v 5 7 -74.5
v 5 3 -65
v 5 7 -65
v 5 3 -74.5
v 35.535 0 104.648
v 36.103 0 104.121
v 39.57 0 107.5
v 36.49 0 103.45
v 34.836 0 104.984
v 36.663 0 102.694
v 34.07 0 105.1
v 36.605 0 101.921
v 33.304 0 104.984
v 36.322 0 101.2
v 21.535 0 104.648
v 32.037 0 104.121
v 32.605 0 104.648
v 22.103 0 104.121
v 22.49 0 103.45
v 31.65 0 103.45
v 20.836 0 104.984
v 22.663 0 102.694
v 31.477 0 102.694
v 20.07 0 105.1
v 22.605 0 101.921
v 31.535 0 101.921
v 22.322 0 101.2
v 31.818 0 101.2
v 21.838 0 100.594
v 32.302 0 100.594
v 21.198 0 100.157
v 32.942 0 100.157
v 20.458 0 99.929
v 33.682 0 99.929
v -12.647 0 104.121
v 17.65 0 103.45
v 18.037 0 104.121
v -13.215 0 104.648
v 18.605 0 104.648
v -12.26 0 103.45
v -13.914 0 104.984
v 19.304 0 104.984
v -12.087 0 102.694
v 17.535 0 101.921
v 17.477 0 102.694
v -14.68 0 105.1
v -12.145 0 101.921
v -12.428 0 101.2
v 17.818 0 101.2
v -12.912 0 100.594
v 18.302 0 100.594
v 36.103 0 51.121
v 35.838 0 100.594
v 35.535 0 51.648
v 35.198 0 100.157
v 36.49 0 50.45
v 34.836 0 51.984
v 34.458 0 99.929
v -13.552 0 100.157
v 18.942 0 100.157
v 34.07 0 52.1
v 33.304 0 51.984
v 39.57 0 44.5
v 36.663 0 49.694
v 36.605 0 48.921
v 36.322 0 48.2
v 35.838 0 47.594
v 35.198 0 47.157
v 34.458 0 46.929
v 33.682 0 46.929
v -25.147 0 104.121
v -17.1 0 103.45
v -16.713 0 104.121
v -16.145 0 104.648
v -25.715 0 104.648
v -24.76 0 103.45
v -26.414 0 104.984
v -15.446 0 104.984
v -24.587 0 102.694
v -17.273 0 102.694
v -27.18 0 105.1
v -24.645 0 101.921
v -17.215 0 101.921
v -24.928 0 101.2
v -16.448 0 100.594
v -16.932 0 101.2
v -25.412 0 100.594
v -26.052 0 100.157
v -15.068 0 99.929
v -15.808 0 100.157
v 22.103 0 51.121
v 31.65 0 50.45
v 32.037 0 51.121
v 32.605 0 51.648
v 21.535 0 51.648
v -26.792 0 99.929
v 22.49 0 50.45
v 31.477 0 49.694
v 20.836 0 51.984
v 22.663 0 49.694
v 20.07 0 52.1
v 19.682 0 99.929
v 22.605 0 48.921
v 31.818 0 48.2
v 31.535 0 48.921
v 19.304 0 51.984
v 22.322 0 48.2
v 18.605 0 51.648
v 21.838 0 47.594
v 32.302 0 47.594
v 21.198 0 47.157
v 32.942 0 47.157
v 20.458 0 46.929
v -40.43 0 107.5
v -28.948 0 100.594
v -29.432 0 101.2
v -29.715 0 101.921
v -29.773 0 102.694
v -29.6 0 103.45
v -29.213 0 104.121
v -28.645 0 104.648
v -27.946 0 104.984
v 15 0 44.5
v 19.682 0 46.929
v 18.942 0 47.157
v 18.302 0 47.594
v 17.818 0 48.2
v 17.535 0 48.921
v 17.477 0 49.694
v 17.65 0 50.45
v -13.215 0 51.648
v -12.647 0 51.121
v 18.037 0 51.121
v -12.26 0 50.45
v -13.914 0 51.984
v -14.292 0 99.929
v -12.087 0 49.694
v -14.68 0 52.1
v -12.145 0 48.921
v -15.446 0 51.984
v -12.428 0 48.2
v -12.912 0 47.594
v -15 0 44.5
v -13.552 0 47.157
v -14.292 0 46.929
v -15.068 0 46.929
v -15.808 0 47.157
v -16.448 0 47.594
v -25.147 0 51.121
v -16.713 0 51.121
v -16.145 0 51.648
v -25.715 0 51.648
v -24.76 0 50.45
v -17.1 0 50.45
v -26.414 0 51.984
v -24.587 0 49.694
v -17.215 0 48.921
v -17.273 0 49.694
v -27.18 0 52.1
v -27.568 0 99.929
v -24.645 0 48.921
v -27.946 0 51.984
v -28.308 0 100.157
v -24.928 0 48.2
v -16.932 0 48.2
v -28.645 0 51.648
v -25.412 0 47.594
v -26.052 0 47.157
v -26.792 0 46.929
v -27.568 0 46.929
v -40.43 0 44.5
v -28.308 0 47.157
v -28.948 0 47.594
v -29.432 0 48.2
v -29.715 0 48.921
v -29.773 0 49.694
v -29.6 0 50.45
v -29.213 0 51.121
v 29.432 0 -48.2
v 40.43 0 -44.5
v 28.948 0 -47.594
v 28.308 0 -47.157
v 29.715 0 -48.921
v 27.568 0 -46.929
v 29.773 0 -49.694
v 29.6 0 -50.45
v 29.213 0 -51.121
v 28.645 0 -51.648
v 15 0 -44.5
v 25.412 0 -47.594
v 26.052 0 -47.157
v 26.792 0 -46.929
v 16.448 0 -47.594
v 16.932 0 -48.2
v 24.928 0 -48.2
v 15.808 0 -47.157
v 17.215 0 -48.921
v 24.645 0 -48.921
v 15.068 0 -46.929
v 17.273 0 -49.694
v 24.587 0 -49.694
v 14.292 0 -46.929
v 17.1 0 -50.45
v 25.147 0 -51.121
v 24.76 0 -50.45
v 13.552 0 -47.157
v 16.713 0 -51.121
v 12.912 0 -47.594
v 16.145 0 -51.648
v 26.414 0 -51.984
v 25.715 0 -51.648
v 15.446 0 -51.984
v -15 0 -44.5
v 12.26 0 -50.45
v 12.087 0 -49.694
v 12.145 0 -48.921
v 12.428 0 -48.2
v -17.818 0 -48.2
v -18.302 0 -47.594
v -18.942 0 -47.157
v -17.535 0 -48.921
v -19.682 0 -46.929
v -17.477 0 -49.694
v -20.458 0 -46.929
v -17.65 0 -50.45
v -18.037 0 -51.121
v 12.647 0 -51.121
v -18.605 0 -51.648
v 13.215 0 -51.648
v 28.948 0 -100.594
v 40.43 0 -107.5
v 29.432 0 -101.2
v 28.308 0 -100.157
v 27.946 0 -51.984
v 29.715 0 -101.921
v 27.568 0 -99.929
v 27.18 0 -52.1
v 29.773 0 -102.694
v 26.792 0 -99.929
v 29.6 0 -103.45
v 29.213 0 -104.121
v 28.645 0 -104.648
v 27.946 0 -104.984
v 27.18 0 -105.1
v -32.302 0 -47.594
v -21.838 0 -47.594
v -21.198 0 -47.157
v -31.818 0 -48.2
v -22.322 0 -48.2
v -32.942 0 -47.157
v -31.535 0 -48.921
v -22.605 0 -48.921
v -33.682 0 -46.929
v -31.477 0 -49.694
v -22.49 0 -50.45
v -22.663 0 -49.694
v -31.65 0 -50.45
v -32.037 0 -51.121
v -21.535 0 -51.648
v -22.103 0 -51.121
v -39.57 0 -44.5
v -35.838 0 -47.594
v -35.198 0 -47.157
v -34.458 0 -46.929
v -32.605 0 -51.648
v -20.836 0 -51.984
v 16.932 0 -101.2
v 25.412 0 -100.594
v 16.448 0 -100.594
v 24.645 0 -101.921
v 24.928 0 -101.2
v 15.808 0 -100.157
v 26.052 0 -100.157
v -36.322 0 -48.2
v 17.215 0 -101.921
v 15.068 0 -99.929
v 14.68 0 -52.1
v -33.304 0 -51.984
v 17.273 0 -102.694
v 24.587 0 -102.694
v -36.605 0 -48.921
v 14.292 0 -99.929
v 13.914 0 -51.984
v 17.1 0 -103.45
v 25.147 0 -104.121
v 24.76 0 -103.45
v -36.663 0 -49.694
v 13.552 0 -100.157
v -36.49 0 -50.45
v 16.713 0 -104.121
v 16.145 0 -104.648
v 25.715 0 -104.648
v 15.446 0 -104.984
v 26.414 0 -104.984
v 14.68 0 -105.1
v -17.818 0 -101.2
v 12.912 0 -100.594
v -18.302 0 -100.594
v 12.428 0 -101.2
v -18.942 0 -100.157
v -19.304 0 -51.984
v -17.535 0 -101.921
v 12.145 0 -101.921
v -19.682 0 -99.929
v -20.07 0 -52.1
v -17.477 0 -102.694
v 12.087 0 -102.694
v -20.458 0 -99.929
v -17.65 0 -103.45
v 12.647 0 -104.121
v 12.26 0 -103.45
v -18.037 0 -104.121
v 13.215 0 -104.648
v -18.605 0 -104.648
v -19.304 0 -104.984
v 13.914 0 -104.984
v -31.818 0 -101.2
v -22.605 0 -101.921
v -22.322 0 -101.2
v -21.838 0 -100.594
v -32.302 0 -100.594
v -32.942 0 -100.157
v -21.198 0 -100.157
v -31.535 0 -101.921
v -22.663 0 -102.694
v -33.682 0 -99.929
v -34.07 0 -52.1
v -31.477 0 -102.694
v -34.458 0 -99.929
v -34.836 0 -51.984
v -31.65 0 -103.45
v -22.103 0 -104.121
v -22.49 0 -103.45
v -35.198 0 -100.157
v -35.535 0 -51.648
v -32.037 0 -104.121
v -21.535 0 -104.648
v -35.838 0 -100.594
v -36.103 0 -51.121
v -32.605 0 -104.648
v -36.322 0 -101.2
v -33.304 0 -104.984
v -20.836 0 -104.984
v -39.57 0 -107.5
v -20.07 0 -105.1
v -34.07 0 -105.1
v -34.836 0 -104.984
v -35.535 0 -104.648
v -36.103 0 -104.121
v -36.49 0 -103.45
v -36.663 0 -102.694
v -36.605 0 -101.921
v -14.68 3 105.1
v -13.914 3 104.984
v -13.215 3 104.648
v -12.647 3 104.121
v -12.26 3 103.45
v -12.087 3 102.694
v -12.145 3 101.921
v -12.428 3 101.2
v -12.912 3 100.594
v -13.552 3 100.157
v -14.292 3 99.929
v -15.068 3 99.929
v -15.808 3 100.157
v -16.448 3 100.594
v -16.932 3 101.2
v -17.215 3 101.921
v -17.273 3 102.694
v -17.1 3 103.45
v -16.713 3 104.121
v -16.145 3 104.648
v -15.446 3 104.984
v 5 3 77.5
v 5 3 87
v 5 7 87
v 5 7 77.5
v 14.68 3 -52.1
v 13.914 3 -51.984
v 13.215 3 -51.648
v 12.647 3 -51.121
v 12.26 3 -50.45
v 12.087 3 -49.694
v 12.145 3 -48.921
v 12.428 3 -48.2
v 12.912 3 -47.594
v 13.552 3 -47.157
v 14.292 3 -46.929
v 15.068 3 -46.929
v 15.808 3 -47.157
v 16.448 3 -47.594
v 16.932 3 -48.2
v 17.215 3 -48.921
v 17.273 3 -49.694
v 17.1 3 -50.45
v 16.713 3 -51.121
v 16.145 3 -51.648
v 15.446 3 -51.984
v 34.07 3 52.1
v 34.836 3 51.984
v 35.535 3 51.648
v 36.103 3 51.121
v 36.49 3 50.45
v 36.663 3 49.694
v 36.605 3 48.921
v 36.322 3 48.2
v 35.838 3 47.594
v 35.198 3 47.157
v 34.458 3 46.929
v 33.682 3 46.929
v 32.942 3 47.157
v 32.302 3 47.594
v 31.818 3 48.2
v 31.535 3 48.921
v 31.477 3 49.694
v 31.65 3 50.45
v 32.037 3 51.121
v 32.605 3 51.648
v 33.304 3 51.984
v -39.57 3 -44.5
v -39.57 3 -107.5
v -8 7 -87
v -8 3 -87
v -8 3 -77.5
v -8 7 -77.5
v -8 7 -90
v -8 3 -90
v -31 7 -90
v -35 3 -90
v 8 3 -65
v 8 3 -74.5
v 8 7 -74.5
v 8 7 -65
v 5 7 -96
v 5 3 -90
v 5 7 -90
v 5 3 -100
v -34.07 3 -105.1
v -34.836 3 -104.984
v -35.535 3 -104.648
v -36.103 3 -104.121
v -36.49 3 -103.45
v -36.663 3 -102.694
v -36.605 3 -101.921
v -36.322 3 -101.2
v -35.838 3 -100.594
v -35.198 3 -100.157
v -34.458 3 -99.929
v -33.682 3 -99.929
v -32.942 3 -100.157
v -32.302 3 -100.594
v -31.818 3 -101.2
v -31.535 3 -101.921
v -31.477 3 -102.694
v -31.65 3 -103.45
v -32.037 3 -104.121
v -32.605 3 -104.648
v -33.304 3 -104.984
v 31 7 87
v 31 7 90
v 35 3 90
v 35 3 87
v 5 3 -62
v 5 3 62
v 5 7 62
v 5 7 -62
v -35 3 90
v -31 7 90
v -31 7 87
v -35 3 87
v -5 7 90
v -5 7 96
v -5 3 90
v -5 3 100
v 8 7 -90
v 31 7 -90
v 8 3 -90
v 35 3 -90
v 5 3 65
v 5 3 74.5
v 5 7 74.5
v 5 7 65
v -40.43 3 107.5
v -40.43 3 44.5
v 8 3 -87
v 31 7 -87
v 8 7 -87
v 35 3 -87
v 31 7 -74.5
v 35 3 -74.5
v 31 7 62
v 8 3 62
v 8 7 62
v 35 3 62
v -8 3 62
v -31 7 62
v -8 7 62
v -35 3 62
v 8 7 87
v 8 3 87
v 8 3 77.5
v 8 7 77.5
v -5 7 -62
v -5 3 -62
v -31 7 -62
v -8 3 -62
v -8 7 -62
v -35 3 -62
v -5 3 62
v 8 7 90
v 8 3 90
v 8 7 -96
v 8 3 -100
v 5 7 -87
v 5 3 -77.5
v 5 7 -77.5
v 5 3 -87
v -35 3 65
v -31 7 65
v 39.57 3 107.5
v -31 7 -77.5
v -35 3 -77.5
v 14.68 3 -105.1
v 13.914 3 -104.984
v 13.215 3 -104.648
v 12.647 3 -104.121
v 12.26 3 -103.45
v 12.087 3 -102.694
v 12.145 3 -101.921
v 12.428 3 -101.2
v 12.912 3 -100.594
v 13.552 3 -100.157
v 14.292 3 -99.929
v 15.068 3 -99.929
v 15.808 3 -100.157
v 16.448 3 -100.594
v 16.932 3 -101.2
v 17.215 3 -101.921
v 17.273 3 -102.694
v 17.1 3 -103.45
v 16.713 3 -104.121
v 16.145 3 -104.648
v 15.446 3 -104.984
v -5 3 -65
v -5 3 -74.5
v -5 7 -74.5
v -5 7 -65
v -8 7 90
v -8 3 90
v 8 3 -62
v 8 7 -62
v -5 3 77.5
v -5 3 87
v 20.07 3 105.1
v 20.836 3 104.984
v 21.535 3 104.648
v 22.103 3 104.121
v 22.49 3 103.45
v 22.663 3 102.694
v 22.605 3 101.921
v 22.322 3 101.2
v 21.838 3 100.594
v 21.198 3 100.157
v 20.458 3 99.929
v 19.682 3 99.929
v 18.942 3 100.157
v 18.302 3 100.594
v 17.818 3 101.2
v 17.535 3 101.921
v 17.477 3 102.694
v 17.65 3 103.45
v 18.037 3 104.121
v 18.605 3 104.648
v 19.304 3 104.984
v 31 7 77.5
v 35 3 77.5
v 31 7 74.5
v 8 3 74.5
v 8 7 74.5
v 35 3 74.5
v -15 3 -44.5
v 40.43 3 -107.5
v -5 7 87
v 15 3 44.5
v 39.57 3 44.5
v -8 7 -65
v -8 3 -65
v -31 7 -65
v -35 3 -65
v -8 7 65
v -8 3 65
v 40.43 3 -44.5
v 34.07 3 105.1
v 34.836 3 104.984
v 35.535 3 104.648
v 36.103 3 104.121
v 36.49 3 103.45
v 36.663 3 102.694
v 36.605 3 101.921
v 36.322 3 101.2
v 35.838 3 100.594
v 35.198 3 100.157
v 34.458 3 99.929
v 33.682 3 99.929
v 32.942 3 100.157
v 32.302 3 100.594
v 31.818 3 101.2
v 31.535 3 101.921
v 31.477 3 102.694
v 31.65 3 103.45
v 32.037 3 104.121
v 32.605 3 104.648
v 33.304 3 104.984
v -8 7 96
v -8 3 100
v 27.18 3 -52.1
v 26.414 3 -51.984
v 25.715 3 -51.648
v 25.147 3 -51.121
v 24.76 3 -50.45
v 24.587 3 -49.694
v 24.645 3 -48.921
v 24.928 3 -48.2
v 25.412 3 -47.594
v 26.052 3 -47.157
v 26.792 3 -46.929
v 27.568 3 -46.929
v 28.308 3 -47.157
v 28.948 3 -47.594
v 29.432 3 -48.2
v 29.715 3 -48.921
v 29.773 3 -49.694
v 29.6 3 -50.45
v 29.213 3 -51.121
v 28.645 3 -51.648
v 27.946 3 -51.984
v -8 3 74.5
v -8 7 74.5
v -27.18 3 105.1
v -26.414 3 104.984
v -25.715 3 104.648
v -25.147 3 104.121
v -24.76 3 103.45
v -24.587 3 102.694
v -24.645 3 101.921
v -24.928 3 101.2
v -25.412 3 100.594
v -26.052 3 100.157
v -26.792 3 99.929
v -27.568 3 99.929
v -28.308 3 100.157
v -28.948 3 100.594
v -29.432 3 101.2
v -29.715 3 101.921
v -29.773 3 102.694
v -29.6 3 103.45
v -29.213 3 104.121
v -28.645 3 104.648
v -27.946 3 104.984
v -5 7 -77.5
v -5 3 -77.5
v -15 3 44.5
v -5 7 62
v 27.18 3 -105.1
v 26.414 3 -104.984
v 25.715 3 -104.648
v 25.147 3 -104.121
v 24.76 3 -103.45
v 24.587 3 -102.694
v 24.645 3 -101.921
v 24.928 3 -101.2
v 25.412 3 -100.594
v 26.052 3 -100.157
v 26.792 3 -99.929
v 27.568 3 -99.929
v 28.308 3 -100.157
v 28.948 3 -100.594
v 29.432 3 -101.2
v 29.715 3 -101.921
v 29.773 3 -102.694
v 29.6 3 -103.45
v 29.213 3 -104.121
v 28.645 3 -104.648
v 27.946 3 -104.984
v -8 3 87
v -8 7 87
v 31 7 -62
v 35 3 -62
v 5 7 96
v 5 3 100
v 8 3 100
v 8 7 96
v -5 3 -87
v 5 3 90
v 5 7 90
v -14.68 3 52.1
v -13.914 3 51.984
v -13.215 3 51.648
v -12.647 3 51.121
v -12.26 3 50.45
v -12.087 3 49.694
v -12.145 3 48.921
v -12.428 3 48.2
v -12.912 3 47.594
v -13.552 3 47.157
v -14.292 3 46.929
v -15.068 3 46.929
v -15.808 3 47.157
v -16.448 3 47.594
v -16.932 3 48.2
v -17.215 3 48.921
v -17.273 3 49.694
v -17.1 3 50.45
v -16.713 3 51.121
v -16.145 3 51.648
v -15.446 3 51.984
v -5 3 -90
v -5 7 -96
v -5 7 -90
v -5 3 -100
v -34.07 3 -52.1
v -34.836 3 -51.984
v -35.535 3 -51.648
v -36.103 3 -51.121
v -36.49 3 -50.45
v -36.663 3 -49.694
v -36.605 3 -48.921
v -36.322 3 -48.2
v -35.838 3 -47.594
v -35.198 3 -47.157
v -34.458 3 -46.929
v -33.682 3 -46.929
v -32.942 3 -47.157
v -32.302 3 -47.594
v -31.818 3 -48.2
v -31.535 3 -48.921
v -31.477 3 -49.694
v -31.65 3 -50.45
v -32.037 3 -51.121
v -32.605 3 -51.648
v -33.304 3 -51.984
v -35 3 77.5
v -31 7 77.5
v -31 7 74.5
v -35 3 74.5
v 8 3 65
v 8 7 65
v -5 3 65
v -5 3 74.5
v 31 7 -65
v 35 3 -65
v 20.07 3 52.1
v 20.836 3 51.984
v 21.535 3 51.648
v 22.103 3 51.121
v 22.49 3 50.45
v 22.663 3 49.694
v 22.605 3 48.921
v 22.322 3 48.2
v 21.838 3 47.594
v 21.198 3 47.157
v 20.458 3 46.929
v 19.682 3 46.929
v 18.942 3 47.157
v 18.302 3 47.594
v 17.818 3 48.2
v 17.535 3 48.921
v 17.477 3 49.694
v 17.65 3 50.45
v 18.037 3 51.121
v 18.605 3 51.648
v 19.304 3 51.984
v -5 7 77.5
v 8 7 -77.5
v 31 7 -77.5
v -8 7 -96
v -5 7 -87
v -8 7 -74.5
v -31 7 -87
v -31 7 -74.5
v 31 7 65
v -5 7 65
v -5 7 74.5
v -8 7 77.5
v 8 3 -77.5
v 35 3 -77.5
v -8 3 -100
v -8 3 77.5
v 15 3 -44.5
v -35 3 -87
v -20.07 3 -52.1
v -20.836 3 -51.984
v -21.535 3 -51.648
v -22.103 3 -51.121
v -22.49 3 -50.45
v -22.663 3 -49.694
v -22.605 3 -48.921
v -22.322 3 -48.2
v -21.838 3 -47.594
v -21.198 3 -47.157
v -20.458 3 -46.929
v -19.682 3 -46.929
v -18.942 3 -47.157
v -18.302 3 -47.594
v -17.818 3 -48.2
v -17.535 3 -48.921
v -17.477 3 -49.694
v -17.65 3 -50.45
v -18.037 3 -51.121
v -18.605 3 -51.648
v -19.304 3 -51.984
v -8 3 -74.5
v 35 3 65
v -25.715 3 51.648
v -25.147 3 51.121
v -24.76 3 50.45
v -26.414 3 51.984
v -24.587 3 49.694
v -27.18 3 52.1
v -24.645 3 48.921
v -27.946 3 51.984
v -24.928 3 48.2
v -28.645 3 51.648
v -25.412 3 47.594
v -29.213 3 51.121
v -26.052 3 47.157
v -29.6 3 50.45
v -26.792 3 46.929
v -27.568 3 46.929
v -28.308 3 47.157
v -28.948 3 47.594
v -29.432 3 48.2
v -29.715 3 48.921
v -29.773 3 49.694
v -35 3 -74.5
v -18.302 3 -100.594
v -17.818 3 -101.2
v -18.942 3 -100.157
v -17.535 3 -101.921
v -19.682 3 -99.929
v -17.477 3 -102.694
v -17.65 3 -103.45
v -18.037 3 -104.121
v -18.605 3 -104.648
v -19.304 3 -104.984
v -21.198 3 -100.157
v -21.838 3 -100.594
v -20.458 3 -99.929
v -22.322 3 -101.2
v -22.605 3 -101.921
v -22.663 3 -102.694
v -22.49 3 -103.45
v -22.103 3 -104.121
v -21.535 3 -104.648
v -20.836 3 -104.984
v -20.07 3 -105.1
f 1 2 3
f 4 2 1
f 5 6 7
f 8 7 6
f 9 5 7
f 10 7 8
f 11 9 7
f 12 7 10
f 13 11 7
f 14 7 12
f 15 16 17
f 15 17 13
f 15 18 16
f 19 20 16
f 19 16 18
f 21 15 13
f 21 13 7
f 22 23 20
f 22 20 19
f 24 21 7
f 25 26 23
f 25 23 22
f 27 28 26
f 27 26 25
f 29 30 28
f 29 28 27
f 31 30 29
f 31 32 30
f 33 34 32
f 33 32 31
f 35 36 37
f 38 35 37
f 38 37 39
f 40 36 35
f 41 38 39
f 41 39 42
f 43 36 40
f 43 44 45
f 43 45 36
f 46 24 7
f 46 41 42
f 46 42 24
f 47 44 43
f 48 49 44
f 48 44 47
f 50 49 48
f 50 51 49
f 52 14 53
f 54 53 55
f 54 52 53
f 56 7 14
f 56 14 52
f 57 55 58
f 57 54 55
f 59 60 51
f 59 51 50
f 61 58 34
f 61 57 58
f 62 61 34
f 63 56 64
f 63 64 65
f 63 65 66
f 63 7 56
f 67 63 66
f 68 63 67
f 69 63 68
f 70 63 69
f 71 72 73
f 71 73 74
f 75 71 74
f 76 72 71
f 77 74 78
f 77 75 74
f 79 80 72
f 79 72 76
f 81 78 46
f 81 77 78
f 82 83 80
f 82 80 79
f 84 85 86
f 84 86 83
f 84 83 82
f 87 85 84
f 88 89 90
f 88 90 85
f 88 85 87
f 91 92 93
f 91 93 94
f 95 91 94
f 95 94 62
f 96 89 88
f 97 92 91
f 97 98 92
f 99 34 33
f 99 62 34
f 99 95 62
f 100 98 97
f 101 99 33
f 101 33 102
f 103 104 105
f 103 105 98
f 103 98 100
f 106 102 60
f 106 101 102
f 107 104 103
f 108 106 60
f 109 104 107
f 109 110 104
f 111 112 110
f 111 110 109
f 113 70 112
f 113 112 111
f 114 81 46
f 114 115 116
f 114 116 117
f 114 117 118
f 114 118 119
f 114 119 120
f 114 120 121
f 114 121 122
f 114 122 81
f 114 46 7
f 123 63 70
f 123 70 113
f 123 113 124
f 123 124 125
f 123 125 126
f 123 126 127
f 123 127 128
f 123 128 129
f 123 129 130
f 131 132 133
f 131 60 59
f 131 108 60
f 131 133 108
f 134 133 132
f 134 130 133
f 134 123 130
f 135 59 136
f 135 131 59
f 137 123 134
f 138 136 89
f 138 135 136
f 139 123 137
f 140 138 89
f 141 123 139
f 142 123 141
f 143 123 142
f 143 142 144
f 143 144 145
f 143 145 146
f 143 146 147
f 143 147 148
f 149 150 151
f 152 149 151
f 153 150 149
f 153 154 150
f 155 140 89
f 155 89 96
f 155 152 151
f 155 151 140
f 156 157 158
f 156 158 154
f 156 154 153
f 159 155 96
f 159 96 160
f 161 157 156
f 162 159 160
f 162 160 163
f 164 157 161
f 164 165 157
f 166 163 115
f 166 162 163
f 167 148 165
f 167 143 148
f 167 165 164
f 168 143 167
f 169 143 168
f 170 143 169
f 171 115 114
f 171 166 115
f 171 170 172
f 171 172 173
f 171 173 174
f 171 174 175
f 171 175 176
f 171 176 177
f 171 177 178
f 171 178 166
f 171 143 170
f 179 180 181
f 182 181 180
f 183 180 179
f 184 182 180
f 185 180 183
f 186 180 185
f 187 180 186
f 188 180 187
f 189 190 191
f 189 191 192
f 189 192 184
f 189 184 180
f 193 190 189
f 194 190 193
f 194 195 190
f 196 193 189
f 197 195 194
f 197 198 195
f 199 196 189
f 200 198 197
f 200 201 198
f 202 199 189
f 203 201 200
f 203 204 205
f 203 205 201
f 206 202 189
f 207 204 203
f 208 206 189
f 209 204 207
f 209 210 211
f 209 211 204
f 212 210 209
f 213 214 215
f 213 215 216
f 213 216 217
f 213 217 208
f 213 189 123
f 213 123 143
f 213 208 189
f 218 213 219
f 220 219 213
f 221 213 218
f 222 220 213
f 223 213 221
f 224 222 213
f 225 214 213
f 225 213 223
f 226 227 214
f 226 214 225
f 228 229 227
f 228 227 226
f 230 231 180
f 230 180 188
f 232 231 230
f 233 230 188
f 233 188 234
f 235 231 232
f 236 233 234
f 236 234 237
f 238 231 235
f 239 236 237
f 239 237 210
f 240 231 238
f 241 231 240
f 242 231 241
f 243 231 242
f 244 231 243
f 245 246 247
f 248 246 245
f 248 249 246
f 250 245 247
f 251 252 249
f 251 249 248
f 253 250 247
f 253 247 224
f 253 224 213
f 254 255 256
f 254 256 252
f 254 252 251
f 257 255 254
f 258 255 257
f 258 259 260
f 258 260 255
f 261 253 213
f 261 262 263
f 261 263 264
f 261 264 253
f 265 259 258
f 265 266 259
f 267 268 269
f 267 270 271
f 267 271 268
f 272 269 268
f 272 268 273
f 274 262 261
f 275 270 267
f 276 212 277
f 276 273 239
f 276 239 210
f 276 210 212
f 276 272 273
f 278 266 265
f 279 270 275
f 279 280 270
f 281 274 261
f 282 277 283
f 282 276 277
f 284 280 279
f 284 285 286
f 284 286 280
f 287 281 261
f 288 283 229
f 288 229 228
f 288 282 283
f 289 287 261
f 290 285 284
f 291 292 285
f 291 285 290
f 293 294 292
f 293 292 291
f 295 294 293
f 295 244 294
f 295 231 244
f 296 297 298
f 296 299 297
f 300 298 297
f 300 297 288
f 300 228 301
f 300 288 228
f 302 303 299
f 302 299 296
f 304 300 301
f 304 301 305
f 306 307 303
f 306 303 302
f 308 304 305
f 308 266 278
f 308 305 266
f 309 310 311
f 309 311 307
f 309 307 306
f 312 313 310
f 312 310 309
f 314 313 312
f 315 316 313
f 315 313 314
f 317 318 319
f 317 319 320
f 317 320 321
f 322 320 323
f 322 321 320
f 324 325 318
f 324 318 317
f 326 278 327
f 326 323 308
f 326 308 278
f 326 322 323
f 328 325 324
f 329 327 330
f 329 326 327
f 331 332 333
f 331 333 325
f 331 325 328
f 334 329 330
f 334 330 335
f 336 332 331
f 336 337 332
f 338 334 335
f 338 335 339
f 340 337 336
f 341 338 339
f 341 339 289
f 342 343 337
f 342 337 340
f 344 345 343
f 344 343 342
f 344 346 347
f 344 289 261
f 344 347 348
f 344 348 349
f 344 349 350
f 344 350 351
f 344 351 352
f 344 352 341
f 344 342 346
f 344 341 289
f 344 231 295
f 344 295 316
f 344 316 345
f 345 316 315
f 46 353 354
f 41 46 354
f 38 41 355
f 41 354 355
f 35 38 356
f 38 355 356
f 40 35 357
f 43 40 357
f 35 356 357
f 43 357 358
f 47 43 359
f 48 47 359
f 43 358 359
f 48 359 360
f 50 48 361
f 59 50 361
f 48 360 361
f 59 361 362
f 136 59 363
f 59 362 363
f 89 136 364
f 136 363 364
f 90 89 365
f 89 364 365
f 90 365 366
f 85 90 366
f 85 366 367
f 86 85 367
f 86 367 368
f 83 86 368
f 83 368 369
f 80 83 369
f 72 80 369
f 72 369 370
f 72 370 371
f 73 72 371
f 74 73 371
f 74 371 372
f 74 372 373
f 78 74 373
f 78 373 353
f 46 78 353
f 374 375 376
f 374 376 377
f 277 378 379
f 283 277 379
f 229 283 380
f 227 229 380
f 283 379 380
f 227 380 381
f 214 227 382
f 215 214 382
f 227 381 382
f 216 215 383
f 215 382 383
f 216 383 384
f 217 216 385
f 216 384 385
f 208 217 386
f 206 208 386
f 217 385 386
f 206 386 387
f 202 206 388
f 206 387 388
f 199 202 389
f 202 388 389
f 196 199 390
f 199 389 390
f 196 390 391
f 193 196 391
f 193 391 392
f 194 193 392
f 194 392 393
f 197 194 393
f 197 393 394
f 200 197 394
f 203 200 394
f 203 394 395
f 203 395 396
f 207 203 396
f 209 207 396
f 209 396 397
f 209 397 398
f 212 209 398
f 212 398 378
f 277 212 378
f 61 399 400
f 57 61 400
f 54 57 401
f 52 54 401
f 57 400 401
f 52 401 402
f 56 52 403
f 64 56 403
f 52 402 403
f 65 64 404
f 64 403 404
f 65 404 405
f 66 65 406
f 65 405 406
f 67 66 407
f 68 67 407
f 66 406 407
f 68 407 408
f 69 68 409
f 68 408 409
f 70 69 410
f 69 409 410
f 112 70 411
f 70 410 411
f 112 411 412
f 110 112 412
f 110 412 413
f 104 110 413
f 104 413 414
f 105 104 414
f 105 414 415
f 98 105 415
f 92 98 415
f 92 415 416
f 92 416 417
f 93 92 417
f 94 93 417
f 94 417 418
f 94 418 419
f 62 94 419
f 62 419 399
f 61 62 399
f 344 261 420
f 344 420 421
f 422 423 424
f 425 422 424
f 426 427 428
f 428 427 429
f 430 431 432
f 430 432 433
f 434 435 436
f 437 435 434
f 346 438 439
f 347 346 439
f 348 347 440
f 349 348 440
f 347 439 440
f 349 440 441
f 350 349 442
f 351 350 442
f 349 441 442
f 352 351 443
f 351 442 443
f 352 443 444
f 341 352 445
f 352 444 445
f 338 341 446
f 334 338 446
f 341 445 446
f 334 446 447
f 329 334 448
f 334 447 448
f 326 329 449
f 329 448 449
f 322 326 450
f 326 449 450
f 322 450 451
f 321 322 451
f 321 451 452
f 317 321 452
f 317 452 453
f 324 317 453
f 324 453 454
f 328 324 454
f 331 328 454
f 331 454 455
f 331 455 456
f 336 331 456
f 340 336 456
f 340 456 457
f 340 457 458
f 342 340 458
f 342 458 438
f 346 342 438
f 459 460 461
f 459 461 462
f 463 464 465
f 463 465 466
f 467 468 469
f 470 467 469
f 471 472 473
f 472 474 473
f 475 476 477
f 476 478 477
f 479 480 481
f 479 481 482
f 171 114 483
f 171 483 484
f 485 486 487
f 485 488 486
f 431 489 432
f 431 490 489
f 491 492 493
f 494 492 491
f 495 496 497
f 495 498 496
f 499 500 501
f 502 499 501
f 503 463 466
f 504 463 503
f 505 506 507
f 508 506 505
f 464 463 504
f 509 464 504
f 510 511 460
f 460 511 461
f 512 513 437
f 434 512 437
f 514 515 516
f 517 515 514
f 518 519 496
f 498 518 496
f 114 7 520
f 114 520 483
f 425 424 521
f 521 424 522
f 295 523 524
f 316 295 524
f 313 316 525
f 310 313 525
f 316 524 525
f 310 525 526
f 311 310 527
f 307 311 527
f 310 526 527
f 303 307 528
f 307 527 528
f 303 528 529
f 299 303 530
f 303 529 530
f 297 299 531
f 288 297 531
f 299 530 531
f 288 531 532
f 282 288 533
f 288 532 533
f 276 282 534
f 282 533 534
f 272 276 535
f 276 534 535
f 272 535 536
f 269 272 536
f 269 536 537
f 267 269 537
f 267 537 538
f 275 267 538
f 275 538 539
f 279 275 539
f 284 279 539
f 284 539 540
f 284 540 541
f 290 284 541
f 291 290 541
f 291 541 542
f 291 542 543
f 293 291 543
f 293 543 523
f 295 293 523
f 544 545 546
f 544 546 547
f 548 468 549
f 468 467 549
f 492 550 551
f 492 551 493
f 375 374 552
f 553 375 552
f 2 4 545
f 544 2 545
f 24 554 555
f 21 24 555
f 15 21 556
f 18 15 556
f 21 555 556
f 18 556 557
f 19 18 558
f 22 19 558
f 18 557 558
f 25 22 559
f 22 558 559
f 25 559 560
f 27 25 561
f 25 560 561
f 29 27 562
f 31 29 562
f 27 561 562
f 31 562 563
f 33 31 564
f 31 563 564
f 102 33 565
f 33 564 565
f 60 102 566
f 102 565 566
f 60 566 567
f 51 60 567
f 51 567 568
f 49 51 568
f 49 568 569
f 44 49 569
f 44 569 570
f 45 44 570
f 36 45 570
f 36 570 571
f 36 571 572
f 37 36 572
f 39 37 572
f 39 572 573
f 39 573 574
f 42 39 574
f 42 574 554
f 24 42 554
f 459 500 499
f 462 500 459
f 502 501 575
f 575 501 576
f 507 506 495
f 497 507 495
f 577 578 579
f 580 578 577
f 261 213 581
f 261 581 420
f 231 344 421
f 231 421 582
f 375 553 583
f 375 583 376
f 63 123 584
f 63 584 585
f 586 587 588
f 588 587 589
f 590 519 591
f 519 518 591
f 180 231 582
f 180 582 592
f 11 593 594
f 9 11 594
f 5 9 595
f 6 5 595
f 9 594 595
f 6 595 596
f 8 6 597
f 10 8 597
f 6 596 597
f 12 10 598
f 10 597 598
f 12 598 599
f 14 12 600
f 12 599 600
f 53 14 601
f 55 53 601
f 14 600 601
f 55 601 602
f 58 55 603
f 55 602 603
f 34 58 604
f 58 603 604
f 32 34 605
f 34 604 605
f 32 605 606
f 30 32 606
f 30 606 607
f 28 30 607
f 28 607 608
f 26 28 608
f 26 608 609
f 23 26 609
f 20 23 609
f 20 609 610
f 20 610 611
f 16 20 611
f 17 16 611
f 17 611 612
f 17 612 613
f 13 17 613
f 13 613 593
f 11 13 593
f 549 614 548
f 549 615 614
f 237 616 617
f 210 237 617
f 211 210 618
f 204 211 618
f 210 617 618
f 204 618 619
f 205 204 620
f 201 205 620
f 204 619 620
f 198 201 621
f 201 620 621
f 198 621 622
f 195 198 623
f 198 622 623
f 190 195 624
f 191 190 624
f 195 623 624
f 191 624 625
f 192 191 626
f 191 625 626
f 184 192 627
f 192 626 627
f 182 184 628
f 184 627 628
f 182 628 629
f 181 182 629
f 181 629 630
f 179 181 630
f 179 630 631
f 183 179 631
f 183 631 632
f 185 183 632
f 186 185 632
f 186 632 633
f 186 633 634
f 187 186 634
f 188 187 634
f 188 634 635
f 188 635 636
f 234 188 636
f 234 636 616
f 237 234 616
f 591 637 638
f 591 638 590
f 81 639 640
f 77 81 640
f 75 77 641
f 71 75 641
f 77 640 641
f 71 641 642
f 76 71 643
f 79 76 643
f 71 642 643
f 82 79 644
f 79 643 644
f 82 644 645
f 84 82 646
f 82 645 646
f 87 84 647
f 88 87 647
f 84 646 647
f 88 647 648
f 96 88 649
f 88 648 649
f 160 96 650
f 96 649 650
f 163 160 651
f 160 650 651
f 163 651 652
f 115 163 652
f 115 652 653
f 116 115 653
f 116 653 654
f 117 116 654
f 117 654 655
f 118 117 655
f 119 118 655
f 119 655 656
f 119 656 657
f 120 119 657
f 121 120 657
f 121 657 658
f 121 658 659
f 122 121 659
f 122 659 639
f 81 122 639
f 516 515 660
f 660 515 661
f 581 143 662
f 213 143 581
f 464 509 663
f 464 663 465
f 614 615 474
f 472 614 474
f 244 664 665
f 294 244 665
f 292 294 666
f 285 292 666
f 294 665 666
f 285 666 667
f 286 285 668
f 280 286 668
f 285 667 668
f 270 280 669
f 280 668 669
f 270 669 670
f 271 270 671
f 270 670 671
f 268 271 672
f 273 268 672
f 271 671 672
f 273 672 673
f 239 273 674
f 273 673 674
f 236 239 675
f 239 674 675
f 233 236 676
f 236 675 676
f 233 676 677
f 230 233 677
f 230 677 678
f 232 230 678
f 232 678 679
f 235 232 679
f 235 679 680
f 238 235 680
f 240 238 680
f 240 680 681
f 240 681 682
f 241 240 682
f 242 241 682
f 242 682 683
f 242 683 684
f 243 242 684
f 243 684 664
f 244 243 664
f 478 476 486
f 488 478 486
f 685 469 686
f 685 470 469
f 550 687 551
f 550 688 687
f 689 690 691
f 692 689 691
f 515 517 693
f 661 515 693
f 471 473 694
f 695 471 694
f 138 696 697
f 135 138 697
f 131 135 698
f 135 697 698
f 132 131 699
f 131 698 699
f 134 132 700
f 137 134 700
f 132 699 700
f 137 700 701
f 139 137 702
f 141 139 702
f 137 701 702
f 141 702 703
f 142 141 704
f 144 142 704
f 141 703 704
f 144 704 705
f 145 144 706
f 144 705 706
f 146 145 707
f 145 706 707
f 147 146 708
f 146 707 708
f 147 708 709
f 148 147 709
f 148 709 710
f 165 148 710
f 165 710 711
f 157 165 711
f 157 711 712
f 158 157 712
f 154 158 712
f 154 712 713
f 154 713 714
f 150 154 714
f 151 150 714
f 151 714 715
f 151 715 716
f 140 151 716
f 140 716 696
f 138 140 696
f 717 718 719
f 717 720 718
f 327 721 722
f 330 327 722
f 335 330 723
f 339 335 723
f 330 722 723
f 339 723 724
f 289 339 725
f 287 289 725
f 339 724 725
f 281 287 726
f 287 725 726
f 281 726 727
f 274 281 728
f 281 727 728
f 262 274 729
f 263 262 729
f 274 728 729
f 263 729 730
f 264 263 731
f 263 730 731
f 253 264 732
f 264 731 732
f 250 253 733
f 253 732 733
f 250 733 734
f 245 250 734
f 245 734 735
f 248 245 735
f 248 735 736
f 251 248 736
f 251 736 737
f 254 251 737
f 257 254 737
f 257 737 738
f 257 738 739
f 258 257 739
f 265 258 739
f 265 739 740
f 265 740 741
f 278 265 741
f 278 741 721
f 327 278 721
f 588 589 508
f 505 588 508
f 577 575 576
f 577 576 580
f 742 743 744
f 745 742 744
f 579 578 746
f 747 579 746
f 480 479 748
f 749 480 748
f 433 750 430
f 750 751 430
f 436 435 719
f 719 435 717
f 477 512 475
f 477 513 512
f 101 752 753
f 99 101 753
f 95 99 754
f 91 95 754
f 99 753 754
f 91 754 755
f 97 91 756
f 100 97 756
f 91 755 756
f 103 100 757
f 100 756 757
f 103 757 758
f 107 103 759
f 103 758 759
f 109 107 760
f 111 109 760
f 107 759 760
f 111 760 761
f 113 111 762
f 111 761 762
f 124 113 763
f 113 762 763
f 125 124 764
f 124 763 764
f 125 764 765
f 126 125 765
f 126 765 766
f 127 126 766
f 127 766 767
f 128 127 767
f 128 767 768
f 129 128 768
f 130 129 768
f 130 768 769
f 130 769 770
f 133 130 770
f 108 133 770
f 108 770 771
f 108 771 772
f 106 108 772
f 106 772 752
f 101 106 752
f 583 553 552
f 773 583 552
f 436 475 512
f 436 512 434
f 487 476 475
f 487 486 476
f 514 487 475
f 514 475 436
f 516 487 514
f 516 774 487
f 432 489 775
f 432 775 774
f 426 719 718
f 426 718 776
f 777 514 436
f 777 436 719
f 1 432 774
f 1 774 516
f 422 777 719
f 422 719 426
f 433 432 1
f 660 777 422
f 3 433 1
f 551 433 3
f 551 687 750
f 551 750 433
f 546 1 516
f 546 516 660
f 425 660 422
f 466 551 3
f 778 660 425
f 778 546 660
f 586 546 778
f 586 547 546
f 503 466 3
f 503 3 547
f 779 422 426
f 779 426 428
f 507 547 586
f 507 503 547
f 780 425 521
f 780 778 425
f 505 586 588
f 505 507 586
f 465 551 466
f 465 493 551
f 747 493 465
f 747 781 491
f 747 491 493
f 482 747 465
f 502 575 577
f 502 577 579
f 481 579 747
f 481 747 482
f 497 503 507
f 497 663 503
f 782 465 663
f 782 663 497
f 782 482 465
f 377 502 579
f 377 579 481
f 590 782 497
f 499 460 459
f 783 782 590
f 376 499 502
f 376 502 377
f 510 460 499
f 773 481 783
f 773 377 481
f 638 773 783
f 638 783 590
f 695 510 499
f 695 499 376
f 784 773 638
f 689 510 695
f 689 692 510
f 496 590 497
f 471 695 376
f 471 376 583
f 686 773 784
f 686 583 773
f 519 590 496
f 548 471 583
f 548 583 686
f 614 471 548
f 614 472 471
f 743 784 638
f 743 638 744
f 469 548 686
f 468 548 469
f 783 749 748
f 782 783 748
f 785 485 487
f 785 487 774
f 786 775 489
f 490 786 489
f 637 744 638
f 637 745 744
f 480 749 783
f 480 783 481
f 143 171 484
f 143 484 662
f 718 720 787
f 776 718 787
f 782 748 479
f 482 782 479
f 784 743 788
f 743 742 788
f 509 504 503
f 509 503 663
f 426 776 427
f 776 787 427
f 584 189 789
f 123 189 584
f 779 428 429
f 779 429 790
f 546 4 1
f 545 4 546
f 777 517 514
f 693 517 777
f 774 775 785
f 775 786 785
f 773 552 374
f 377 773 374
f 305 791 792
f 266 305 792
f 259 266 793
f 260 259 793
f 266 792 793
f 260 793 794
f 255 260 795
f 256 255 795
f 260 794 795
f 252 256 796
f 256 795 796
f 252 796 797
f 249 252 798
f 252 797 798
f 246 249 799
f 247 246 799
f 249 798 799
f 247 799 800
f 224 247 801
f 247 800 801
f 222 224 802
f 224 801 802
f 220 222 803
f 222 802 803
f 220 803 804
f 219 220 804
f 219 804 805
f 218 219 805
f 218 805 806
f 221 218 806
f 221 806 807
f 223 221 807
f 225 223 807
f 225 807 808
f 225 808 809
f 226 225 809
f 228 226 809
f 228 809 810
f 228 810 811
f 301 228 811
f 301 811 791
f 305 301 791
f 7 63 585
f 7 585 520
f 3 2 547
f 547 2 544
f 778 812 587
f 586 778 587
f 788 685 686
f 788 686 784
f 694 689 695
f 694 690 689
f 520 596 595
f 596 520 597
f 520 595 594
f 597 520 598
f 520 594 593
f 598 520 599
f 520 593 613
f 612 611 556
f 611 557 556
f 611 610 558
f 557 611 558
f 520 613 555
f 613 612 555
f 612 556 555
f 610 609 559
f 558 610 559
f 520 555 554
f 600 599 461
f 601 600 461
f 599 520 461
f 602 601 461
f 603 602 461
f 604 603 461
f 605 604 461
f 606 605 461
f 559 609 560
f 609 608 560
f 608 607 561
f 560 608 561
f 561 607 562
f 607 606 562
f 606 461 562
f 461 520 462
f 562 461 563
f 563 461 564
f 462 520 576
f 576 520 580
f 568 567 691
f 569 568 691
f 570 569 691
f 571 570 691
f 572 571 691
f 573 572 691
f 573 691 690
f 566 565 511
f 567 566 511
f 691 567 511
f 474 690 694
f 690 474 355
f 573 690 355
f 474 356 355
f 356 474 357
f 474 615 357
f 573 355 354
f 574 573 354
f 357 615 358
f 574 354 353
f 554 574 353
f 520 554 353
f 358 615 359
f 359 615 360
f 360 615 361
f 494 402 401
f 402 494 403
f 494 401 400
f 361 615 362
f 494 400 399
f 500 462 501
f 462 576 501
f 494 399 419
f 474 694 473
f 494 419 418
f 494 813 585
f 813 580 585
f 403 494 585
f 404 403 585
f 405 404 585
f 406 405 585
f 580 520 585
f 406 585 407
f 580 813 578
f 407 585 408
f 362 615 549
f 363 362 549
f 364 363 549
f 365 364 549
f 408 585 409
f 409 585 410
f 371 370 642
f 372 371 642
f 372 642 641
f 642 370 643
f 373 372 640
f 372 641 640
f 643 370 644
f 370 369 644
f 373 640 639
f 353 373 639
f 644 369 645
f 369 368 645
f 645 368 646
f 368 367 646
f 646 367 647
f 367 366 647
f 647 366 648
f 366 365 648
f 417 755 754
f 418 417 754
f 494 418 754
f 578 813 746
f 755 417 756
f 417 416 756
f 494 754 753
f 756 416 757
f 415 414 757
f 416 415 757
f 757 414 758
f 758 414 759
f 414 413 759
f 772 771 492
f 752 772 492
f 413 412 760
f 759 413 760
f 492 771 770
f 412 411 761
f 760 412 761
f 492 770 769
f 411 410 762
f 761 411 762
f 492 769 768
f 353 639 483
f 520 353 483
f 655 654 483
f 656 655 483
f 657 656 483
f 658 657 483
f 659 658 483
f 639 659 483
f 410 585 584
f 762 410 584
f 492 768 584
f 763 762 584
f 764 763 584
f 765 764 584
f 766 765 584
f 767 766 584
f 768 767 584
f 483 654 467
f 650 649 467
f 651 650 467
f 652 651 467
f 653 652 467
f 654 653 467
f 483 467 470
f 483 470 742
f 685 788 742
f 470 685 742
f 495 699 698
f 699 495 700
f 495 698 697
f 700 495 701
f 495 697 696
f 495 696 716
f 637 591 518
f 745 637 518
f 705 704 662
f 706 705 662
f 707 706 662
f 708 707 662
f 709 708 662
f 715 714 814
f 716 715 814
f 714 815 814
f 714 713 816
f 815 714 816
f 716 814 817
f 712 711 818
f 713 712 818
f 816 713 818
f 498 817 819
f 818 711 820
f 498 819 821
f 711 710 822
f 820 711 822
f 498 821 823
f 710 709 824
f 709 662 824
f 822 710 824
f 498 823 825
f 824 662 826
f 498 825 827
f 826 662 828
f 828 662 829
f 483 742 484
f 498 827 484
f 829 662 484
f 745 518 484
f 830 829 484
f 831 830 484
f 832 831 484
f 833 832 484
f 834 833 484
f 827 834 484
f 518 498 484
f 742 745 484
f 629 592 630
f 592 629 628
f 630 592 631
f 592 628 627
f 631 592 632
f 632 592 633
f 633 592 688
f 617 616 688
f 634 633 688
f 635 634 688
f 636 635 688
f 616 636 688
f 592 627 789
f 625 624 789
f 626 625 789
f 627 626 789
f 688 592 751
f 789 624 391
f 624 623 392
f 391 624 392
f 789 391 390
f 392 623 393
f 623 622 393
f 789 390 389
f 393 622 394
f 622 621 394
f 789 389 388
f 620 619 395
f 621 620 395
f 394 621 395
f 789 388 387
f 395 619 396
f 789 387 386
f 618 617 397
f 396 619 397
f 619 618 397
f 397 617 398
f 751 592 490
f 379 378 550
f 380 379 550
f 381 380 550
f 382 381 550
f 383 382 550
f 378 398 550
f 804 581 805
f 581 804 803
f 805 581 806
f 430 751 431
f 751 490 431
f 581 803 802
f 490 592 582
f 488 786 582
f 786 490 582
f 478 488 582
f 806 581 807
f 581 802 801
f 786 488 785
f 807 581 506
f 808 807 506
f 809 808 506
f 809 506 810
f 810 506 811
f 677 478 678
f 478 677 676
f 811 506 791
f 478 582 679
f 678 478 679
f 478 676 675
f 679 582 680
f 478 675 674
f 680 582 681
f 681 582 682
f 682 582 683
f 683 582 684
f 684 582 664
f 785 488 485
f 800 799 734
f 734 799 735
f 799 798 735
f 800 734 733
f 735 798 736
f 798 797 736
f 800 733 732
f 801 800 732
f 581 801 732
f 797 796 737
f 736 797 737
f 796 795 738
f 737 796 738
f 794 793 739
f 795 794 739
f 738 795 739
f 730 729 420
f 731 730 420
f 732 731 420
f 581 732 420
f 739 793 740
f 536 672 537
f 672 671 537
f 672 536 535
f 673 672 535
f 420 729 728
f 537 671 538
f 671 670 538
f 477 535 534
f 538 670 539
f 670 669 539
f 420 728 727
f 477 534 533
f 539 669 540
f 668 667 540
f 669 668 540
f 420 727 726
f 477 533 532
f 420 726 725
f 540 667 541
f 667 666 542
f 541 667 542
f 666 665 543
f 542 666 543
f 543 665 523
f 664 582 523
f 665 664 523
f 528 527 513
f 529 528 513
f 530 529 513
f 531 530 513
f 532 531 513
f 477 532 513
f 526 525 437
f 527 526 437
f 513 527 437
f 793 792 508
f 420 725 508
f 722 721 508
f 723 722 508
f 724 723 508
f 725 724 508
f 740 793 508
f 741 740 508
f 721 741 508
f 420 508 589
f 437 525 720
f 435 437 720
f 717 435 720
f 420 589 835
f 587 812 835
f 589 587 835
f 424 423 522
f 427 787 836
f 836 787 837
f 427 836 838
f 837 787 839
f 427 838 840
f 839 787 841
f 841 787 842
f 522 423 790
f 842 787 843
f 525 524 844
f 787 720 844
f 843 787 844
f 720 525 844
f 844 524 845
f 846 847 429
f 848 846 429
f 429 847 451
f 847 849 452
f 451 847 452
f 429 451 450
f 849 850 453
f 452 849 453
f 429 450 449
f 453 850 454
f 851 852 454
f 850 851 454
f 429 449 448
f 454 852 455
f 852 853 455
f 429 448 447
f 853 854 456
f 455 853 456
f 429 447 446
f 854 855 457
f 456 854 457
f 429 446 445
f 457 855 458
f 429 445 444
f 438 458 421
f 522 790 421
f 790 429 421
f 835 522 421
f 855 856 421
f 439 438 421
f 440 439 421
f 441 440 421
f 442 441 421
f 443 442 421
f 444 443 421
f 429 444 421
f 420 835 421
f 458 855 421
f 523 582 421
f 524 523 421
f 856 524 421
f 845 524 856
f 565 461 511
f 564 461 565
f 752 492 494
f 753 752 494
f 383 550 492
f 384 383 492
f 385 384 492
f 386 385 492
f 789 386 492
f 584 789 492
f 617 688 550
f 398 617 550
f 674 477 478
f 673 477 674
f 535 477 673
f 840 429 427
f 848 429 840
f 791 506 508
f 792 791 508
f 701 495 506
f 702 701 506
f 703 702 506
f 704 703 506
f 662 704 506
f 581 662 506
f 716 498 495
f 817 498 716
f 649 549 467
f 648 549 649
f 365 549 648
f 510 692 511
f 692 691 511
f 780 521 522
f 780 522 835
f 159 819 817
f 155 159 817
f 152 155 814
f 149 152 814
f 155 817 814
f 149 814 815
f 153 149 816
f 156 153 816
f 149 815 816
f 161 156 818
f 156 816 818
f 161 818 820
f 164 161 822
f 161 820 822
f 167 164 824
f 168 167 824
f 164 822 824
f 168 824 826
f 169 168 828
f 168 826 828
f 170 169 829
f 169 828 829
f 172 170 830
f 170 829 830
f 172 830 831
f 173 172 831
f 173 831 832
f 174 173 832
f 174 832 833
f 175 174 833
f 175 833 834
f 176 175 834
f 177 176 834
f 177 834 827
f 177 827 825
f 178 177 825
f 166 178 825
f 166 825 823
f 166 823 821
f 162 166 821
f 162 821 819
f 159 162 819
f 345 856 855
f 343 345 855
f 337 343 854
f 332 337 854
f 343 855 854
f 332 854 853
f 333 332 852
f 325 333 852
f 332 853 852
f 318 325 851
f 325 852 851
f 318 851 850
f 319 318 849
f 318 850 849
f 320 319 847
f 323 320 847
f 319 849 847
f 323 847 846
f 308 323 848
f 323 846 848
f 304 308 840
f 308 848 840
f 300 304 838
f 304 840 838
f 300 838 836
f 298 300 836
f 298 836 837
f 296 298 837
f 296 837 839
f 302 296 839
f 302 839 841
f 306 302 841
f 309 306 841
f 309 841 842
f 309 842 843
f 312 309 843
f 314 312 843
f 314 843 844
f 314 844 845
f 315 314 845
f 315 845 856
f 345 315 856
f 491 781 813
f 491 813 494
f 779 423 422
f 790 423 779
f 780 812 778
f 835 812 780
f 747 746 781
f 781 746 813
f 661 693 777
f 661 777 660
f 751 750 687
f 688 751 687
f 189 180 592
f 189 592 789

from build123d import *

# Parameters (mm, degrees)
BOSS_EXTRUDE1_DEPTH          = 3
SKETCH2_R                    = 2.6
CUT_EXTRUDE1_DEPTH           = 115.890534423
CIRPATTERN1_COUNT            = 2
SKETCH4_W                    = 3
SKETCH4_H                    = 100
BOSS_EXTRUDE2_DEPTH          = 4
BOSS_EXTRUDE3_START          = -4
SKETCH5_W                    = 70
SKETCH5_H                    = 3
BOSS_EXTRUDE3_DEPTH          = 4
CHAMFER2_SIZE                = 4
CIRPATTERN2_COUNT            = 2
CHAMFER2_OF_CIRPATTERN2_SIZE = 4


with BuildPart() as part:
    # Sketch1 → Boss-Extrude1 (new body)
    with BuildSketch(Plane(origin=(0, 0, 0), x_dir=(1, 0, 0), z_dir=(0, 1, 0))):
        Polygon((39.57, -44.5), (39.57, -107.5), (-40.43, -107.5), (-40.43, -44.5), (-15, -44.5), (-15, 44.5), (-39.57, 44.5), (-39.57, 107.5), (40.43, 107.5), (40.43, 44.5), (15, 44.5), (15, -44.5), align=None)
    extrude(amount=BOSS_EXTRUDE1_DEPTH)

    # Sketch2 → Cut-Extrude1 (cut, through all)
    with BuildSketch(Plane(origin=(0, 3, 0), x_dir=(1, 0, 0), z_dir=(0, 1, 0))):
        with Locations(Location((20.07, -49.5, 0), (0, 0, 270))):
            Circle(SKETCH2_R)
        with Locations(Location((34.07, -49.5, 0), (0, 0, 270))):
            Circle(SKETCH2_R)
        with Locations(Location((34.07, -102.5, 0), (0, 0, 270))):
            Circle(SKETCH2_R)
        with Locations(Location((20.07, -102.5, 0), (0, 0, 270))):
            Circle(SKETCH2_R)
        with Locations(Location((-14.68, -49.5, 0), (0, 0, 270))):
            Circle(SKETCH2_R)
        with Locations(Location((-27.18, -49.5, 0), (0, 0, 270))):
            Circle(SKETCH2_R)
        with Locations(Location((-14.68, -102.5, 0), (0, 0, 270))):
            Circle(SKETCH2_R)
        with Locations(Location((-27.18, -102.5, 0), (0, 0, 270))):
            Circle(SKETCH2_R)
    cut_extrude1 = extrude(amount=-CUT_EXTRUDE1_DEPTH, mode=Mode.SUBTRACT)

    # CirPattern1: Cut-Extrude1 ×2 about axis
    cirpattern1_axis = Axis((0, 0, 0), (0, 1, 0))
    for i in range(1, CIRPATTERN1_COUNT):
        add(cut_extrude1.rotate(cirpattern1_axis, i * 360 / CIRPATTERN1_COUNT), mode=Mode.SUBTRACT)

    # Sketch4 → Boss-Extrude2 (add)
    with BuildSketch(Plane(origin=(0, 3, 0), x_dir=(1, 0, 0), z_dir=(0, 1, 0))):
        with Locations((6.5, -50)):
            Rectangle(SKETCH4_W, SKETCH4_H)
        with Locations((-6.5, -50)):
            Rectangle(SKETCH4_W, SKETCH4_H)
    boss_extrude2 = extrude(amount=BOSS_EXTRUDE2_DEPTH)

    # Sketch5 → Boss-Extrude3 (add)
    with BuildSketch(Plane(origin=(0, 7, 0), x_dir=(1, 0, 0), z_dir=(0, 1, 0)).offset(BOSS_EXTRUDE3_START)):
        with Locations((0, -88.5)):
            Rectangle(SKETCH5_W, SKETCH5_H)
        with Locations((0, -63.5)):
            Rectangle(SKETCH5_W, SKETCH5_H)
        with Locations((0, -76)):
            Rectangle(SKETCH5_W, SKETCH5_H)
    boss_extrude3 = extrude(amount=BOSS_EXTRUDE3_DEPTH)

    # Chamfer2
    chamfer2_edges = [part.edges().sort_by_distance(p)[0] for p in [
        (35, 7, 63.5),
        (35, 7, 76),
        (35, 7, 88.5),
        (6.5, 7, 100),
        (-6.5, 7, 100),
        (-35, 7, 88.5),
        (-35, 7, 76),
        (-35, 7, 63.5),
    ]]
    chamfer(chamfer2_edges, length=CHAMFER2_SIZE - 0.0001)  # a hair under: the kernel refuses the full size

    # CirPattern2: Boss-Extrude2, Boss-Extrude3 ×2 about axis
    cirpattern2_axis = Axis((0, 0, 0), (0, 1, 0))
    add([boss_extrude2.rotate(cirpattern2_axis, i * 360 / CIRPATTERN2_COUNT) for i in range(1, CIRPATTERN2_COUNT)])
    add([boss_extrude3.rotate(cirpattern2_axis, i * 360 / CIRPATTERN2_COUNT) for i in range(1, CIRPATTERN2_COUNT)])

    # Chamfer2 of CirPattern2
    chamfer2_of_cirpattern2_edges = [part.edges().sort_by_distance(p)[0] for p in [
        (-35, 7, -63.5),
        (-35, 7, -76),
        (-35, 7, -88.5),
        (-6.5, 7, -100),
        (6.5, 7, -100),
        (35, 7, -88.5),
        (35, 7, -76),
        (35, 7, -63.5),
    ]]
    chamfer(chamfer2_of_cirpattern2_edges, length=CHAMFER2_OF_CIRPATTERN2_SIZE - 0.0001)  # a hair under: the kernel refuses the full size


solid = part.part
